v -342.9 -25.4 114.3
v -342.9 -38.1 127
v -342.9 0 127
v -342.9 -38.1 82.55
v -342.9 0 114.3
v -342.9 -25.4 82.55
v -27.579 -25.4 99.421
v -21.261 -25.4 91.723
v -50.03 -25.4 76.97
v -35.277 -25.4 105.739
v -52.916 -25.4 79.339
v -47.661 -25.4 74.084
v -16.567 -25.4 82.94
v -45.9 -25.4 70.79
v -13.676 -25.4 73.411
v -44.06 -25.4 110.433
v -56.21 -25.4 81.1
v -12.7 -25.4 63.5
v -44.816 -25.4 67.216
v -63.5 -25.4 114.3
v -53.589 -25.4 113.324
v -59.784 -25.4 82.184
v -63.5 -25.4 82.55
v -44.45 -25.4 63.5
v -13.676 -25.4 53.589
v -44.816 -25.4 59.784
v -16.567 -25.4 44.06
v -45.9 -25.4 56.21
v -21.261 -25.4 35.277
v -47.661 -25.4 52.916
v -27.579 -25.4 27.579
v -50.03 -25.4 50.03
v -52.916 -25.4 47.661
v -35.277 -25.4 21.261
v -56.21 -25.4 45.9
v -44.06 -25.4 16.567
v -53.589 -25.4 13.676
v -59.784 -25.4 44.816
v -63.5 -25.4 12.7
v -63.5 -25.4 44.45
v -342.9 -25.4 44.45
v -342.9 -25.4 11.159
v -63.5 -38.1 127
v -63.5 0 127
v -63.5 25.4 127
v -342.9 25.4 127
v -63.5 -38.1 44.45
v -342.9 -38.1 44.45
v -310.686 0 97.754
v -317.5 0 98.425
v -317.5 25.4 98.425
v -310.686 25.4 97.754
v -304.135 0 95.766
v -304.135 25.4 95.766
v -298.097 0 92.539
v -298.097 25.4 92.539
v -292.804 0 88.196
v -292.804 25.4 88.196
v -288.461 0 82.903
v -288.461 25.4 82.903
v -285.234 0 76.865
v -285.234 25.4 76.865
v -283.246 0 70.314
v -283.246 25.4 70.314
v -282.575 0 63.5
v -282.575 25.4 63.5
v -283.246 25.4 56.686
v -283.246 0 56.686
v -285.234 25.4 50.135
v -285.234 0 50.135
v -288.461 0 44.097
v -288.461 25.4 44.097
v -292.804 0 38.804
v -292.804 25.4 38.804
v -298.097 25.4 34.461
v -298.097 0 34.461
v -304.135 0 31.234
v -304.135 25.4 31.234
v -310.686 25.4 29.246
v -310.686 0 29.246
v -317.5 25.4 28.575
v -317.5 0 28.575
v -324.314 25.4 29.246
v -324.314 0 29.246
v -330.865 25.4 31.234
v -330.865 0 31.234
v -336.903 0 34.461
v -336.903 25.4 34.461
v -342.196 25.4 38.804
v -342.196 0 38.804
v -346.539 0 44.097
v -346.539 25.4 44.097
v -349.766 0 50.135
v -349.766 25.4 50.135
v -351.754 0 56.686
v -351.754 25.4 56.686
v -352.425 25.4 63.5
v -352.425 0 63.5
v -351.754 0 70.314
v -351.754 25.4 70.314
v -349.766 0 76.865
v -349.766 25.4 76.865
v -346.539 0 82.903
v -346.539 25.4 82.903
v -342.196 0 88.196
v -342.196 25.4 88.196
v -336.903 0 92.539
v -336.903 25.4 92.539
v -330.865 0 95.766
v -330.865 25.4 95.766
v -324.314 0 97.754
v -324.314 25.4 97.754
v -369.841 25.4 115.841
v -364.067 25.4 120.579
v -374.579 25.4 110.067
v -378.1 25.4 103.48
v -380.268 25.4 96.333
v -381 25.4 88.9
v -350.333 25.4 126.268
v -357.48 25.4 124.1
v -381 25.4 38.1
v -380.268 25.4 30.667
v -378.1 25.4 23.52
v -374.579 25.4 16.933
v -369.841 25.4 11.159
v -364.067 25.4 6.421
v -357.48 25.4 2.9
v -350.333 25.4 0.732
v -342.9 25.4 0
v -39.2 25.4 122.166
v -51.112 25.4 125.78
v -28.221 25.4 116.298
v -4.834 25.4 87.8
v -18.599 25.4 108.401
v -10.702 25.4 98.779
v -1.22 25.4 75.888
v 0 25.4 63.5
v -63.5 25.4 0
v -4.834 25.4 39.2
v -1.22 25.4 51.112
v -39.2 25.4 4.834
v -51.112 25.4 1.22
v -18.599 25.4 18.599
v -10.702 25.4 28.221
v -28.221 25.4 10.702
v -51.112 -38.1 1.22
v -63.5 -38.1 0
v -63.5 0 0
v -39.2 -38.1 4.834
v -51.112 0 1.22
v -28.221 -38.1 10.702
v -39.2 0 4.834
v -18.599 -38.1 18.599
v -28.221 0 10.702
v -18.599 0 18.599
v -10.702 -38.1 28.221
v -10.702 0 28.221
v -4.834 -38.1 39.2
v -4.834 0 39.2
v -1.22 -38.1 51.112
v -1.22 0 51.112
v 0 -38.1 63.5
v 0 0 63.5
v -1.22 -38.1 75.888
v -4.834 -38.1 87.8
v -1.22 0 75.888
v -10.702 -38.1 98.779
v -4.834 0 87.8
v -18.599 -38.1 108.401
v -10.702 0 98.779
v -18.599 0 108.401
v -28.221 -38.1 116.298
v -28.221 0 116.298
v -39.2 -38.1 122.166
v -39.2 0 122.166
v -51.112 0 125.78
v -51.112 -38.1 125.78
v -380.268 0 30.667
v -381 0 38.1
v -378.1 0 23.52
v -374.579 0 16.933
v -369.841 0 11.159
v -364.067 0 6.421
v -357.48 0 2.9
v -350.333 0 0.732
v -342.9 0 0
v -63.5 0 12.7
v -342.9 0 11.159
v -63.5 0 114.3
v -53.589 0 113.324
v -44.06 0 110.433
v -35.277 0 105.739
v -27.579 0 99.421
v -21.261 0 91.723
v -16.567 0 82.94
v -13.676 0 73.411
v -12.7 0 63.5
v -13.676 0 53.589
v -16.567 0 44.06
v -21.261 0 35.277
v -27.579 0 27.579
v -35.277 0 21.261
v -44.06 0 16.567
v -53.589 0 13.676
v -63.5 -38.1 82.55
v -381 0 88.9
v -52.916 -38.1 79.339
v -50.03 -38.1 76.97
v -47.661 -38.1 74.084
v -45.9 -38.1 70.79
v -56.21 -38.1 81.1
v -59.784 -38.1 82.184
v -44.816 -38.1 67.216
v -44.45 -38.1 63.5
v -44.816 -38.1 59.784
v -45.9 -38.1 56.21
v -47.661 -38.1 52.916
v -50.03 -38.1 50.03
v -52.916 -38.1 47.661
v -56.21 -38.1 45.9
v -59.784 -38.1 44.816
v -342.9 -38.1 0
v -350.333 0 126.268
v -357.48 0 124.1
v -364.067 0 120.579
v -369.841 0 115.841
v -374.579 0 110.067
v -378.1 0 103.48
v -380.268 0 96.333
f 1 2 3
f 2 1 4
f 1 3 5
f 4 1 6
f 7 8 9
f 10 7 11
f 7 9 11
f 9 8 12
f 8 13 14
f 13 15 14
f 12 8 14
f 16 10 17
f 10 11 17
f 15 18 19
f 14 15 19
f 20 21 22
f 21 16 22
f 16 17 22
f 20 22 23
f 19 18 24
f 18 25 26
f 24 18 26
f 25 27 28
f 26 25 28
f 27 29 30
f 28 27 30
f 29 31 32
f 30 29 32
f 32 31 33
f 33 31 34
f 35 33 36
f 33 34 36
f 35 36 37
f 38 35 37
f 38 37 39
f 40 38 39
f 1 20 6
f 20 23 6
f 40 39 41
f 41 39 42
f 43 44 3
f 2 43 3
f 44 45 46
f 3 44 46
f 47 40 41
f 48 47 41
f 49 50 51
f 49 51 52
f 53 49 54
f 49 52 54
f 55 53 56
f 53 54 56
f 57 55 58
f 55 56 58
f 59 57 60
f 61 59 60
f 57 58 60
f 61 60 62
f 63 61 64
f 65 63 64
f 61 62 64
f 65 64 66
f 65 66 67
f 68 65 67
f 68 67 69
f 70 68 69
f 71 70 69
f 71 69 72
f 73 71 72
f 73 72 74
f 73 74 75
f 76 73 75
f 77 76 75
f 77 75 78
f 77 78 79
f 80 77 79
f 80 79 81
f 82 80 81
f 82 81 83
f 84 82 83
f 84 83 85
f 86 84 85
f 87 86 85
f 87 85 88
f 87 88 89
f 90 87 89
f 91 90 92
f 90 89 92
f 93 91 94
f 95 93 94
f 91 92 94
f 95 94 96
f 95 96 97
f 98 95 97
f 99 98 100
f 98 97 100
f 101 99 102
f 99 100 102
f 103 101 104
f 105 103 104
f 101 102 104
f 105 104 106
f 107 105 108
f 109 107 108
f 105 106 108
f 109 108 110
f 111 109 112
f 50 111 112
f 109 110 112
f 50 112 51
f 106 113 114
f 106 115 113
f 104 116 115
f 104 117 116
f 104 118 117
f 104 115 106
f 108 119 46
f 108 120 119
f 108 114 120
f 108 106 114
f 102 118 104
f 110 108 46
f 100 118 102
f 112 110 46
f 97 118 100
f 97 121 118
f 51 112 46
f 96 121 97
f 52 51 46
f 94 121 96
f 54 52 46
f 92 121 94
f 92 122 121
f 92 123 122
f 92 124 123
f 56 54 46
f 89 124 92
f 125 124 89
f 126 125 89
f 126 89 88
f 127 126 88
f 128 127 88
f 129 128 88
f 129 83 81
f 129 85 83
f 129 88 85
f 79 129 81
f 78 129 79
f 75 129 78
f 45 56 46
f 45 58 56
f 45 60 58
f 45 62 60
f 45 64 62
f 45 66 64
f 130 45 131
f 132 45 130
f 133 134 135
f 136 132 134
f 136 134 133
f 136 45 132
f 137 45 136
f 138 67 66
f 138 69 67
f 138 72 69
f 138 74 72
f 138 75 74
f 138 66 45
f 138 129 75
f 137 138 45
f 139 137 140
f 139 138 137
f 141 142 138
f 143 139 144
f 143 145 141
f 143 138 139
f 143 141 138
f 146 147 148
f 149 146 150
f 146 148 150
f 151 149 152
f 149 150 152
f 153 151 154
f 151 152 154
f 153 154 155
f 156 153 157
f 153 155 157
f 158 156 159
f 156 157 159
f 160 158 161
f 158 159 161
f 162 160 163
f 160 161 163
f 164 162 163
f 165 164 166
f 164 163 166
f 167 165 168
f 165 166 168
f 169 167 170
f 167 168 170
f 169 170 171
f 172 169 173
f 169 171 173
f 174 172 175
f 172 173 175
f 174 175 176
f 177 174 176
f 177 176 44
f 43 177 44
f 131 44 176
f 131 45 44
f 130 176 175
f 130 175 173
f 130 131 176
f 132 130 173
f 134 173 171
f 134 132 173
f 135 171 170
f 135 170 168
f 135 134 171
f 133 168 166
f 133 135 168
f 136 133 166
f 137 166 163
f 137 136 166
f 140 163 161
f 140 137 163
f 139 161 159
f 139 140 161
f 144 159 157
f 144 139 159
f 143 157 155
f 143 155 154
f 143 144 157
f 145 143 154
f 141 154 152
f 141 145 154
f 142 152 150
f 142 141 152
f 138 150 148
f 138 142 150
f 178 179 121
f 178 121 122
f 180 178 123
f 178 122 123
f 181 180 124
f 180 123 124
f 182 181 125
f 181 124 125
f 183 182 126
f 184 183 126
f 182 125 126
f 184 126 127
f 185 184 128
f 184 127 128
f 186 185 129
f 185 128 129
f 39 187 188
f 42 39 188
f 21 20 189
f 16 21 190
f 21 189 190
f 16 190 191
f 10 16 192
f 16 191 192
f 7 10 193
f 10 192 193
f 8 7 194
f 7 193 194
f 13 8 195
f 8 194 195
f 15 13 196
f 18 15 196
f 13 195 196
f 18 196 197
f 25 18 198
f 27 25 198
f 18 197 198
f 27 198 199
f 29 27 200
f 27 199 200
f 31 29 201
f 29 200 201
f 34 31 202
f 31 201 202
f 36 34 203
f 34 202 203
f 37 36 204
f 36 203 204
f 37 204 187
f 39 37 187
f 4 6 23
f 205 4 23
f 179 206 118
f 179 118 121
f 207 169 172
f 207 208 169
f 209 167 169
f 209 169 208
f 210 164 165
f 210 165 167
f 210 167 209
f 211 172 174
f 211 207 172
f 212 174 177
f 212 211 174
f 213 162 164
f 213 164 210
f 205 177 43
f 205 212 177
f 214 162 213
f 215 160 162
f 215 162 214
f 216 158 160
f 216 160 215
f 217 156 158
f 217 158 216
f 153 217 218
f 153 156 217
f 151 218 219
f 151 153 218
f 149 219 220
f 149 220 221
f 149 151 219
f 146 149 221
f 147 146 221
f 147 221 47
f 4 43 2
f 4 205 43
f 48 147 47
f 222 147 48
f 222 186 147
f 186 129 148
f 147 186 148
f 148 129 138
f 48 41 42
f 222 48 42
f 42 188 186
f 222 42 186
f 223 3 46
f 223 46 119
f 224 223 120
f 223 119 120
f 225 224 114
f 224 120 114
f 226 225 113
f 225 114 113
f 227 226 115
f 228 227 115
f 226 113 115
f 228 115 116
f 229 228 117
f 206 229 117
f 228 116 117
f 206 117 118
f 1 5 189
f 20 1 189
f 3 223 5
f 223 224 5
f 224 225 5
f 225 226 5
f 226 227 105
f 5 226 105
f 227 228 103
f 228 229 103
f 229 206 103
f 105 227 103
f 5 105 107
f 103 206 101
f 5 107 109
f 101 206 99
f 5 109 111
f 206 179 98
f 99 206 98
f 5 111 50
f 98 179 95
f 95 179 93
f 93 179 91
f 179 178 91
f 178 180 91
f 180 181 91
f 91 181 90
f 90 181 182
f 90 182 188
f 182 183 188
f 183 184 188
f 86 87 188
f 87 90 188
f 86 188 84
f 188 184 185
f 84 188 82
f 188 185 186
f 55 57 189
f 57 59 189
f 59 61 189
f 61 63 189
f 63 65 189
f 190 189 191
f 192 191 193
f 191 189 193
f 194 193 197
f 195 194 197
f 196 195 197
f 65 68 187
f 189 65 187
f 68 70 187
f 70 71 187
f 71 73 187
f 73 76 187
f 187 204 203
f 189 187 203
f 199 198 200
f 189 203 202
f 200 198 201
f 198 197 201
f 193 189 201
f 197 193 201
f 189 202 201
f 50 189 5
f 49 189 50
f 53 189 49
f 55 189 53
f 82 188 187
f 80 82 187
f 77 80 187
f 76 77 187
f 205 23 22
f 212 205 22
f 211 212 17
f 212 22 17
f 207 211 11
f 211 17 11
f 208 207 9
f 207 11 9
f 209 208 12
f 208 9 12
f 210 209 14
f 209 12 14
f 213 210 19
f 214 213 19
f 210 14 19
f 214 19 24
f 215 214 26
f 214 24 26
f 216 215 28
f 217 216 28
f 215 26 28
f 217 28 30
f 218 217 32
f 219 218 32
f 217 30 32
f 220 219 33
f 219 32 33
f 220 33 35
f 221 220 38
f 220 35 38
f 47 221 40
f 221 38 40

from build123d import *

# Parameters (mm, degrees)
SKETCH1_W           = 381
SKETCH1_H           = 127
BOSS_EXTRUDE1_DEPTH = 25.4
FILLET1_R           = 63.5
FILLET2_R           = 38.1
BOSS_EXTRUDE2_DEPTH = 25.4
BOSS_EXTRUDE3_DEPTH = 12.7
SKETCH11_R          = 34.925
CUT_EXTRUDE4_DEPTH  = 38.1


with BuildPart() as part:
    # Sketch1 → Boss-Extrude1 (new body)
    with BuildSketch(Plane(origin=(0, 0, 0), x_dir=(1, 0, 0), z_dir=(0, 1, 0))):
        with Locations((-190.5, -63.5)):
            Rectangle(SKETCH1_W, SKETCH1_H)
    extrude(amount=BOSS_EXTRUDE1_DEPTH)

    # Fillet1
    fillet1_edges = [part.edges().sort_by_distance(p)[0] for p in [
        (0, 12.7, 0),
        (0, 12.7, 127),
    ]]
    fillet(fillet1_edges, radius=FILLET1_R - 0.0001)  # a hair under: the kernel refuses the full size

    # Fillet2
    fillet2_edges = [part.edges().sort_by_distance(p)[0] for p in [
        (-381, 12.7, 127),
        (-381, 12.7, 0),
    ]]
    fillet(fillet2_edges, radius=FILLET2_R)

    # Sketch2 → Boss-Extrude2 (add)
    with BuildSketch(Plane(origin=(0, 0, 0), x_dir=(1, 0, 0), z_dir=(0, 1, 0))):
        with BuildLine():
            Line((-63.5, -12.7), (-342.9, -11.159231637))
            Line((-342.9, -11.159231637), (-342.9, 0))
            Line((-342.9, 0), (-63.5, 0))
            ThreePointArc((-63.5, 0), (0, -63.5), (-63.5, -127))
            Line((-63.5, -127), (-342.9, -127))
            Line((-342.9, -127), (-342.9, -114.3))
            Line((-342.9, -114.3), (-63.5, -114.3))
            ThreePointArc((-63.5, -114.3), (-12.7, -63.5), (-63.5, -12.7))
        make_face()
    extrude(amount=-BOSS_EXTRUDE2_DEPTH)

    # Sketch3 → Boss-Extrude3 (add)
    with BuildSketch(Plane(origin=(0, -25.4, 0), x_dir=(1, 0, 0), z_dir=(0, 1, 0))):
        with BuildLine():
            Line((-342.9, -127), (-342.9, -82.55))
            Line((-342.9, -82.55), (-63.5, -82.55))
            ThreePointArc((-63.5, -82.55), (-44.45, -63.5), (-63.5, -44.45))
            Line((-63.5, -44.45), (-342.9, -44.45))
            Line((-342.9, -44.45), (-342.9, 0))
            Line((-342.9, 0), (-63.5, 0))
            ThreePointArc((-63.5, 0), (0, -63.5), (-63.5, -127))
            Line((-63.5, -127), (-342.9, -127))
        make_face()
    extrude(amount=-BOSS_EXTRUDE3_DEPTH)

    # Sketch11 → Cut-Extrude4 (cut)
    with BuildSketch(Plane(origin=(0, 25.4, 0), x_dir=(1, 0, 0), z_dir=(0, 1, 0))):
        with Locations(Location((-317.5, -63.5, 0), (0, 0, 270))):
            Circle(SKETCH11_R)
    extrude(amount=-CUT_EXTRUDE4_DEPTH, mode=Mode.SUBTRACT)


solid = part.part
